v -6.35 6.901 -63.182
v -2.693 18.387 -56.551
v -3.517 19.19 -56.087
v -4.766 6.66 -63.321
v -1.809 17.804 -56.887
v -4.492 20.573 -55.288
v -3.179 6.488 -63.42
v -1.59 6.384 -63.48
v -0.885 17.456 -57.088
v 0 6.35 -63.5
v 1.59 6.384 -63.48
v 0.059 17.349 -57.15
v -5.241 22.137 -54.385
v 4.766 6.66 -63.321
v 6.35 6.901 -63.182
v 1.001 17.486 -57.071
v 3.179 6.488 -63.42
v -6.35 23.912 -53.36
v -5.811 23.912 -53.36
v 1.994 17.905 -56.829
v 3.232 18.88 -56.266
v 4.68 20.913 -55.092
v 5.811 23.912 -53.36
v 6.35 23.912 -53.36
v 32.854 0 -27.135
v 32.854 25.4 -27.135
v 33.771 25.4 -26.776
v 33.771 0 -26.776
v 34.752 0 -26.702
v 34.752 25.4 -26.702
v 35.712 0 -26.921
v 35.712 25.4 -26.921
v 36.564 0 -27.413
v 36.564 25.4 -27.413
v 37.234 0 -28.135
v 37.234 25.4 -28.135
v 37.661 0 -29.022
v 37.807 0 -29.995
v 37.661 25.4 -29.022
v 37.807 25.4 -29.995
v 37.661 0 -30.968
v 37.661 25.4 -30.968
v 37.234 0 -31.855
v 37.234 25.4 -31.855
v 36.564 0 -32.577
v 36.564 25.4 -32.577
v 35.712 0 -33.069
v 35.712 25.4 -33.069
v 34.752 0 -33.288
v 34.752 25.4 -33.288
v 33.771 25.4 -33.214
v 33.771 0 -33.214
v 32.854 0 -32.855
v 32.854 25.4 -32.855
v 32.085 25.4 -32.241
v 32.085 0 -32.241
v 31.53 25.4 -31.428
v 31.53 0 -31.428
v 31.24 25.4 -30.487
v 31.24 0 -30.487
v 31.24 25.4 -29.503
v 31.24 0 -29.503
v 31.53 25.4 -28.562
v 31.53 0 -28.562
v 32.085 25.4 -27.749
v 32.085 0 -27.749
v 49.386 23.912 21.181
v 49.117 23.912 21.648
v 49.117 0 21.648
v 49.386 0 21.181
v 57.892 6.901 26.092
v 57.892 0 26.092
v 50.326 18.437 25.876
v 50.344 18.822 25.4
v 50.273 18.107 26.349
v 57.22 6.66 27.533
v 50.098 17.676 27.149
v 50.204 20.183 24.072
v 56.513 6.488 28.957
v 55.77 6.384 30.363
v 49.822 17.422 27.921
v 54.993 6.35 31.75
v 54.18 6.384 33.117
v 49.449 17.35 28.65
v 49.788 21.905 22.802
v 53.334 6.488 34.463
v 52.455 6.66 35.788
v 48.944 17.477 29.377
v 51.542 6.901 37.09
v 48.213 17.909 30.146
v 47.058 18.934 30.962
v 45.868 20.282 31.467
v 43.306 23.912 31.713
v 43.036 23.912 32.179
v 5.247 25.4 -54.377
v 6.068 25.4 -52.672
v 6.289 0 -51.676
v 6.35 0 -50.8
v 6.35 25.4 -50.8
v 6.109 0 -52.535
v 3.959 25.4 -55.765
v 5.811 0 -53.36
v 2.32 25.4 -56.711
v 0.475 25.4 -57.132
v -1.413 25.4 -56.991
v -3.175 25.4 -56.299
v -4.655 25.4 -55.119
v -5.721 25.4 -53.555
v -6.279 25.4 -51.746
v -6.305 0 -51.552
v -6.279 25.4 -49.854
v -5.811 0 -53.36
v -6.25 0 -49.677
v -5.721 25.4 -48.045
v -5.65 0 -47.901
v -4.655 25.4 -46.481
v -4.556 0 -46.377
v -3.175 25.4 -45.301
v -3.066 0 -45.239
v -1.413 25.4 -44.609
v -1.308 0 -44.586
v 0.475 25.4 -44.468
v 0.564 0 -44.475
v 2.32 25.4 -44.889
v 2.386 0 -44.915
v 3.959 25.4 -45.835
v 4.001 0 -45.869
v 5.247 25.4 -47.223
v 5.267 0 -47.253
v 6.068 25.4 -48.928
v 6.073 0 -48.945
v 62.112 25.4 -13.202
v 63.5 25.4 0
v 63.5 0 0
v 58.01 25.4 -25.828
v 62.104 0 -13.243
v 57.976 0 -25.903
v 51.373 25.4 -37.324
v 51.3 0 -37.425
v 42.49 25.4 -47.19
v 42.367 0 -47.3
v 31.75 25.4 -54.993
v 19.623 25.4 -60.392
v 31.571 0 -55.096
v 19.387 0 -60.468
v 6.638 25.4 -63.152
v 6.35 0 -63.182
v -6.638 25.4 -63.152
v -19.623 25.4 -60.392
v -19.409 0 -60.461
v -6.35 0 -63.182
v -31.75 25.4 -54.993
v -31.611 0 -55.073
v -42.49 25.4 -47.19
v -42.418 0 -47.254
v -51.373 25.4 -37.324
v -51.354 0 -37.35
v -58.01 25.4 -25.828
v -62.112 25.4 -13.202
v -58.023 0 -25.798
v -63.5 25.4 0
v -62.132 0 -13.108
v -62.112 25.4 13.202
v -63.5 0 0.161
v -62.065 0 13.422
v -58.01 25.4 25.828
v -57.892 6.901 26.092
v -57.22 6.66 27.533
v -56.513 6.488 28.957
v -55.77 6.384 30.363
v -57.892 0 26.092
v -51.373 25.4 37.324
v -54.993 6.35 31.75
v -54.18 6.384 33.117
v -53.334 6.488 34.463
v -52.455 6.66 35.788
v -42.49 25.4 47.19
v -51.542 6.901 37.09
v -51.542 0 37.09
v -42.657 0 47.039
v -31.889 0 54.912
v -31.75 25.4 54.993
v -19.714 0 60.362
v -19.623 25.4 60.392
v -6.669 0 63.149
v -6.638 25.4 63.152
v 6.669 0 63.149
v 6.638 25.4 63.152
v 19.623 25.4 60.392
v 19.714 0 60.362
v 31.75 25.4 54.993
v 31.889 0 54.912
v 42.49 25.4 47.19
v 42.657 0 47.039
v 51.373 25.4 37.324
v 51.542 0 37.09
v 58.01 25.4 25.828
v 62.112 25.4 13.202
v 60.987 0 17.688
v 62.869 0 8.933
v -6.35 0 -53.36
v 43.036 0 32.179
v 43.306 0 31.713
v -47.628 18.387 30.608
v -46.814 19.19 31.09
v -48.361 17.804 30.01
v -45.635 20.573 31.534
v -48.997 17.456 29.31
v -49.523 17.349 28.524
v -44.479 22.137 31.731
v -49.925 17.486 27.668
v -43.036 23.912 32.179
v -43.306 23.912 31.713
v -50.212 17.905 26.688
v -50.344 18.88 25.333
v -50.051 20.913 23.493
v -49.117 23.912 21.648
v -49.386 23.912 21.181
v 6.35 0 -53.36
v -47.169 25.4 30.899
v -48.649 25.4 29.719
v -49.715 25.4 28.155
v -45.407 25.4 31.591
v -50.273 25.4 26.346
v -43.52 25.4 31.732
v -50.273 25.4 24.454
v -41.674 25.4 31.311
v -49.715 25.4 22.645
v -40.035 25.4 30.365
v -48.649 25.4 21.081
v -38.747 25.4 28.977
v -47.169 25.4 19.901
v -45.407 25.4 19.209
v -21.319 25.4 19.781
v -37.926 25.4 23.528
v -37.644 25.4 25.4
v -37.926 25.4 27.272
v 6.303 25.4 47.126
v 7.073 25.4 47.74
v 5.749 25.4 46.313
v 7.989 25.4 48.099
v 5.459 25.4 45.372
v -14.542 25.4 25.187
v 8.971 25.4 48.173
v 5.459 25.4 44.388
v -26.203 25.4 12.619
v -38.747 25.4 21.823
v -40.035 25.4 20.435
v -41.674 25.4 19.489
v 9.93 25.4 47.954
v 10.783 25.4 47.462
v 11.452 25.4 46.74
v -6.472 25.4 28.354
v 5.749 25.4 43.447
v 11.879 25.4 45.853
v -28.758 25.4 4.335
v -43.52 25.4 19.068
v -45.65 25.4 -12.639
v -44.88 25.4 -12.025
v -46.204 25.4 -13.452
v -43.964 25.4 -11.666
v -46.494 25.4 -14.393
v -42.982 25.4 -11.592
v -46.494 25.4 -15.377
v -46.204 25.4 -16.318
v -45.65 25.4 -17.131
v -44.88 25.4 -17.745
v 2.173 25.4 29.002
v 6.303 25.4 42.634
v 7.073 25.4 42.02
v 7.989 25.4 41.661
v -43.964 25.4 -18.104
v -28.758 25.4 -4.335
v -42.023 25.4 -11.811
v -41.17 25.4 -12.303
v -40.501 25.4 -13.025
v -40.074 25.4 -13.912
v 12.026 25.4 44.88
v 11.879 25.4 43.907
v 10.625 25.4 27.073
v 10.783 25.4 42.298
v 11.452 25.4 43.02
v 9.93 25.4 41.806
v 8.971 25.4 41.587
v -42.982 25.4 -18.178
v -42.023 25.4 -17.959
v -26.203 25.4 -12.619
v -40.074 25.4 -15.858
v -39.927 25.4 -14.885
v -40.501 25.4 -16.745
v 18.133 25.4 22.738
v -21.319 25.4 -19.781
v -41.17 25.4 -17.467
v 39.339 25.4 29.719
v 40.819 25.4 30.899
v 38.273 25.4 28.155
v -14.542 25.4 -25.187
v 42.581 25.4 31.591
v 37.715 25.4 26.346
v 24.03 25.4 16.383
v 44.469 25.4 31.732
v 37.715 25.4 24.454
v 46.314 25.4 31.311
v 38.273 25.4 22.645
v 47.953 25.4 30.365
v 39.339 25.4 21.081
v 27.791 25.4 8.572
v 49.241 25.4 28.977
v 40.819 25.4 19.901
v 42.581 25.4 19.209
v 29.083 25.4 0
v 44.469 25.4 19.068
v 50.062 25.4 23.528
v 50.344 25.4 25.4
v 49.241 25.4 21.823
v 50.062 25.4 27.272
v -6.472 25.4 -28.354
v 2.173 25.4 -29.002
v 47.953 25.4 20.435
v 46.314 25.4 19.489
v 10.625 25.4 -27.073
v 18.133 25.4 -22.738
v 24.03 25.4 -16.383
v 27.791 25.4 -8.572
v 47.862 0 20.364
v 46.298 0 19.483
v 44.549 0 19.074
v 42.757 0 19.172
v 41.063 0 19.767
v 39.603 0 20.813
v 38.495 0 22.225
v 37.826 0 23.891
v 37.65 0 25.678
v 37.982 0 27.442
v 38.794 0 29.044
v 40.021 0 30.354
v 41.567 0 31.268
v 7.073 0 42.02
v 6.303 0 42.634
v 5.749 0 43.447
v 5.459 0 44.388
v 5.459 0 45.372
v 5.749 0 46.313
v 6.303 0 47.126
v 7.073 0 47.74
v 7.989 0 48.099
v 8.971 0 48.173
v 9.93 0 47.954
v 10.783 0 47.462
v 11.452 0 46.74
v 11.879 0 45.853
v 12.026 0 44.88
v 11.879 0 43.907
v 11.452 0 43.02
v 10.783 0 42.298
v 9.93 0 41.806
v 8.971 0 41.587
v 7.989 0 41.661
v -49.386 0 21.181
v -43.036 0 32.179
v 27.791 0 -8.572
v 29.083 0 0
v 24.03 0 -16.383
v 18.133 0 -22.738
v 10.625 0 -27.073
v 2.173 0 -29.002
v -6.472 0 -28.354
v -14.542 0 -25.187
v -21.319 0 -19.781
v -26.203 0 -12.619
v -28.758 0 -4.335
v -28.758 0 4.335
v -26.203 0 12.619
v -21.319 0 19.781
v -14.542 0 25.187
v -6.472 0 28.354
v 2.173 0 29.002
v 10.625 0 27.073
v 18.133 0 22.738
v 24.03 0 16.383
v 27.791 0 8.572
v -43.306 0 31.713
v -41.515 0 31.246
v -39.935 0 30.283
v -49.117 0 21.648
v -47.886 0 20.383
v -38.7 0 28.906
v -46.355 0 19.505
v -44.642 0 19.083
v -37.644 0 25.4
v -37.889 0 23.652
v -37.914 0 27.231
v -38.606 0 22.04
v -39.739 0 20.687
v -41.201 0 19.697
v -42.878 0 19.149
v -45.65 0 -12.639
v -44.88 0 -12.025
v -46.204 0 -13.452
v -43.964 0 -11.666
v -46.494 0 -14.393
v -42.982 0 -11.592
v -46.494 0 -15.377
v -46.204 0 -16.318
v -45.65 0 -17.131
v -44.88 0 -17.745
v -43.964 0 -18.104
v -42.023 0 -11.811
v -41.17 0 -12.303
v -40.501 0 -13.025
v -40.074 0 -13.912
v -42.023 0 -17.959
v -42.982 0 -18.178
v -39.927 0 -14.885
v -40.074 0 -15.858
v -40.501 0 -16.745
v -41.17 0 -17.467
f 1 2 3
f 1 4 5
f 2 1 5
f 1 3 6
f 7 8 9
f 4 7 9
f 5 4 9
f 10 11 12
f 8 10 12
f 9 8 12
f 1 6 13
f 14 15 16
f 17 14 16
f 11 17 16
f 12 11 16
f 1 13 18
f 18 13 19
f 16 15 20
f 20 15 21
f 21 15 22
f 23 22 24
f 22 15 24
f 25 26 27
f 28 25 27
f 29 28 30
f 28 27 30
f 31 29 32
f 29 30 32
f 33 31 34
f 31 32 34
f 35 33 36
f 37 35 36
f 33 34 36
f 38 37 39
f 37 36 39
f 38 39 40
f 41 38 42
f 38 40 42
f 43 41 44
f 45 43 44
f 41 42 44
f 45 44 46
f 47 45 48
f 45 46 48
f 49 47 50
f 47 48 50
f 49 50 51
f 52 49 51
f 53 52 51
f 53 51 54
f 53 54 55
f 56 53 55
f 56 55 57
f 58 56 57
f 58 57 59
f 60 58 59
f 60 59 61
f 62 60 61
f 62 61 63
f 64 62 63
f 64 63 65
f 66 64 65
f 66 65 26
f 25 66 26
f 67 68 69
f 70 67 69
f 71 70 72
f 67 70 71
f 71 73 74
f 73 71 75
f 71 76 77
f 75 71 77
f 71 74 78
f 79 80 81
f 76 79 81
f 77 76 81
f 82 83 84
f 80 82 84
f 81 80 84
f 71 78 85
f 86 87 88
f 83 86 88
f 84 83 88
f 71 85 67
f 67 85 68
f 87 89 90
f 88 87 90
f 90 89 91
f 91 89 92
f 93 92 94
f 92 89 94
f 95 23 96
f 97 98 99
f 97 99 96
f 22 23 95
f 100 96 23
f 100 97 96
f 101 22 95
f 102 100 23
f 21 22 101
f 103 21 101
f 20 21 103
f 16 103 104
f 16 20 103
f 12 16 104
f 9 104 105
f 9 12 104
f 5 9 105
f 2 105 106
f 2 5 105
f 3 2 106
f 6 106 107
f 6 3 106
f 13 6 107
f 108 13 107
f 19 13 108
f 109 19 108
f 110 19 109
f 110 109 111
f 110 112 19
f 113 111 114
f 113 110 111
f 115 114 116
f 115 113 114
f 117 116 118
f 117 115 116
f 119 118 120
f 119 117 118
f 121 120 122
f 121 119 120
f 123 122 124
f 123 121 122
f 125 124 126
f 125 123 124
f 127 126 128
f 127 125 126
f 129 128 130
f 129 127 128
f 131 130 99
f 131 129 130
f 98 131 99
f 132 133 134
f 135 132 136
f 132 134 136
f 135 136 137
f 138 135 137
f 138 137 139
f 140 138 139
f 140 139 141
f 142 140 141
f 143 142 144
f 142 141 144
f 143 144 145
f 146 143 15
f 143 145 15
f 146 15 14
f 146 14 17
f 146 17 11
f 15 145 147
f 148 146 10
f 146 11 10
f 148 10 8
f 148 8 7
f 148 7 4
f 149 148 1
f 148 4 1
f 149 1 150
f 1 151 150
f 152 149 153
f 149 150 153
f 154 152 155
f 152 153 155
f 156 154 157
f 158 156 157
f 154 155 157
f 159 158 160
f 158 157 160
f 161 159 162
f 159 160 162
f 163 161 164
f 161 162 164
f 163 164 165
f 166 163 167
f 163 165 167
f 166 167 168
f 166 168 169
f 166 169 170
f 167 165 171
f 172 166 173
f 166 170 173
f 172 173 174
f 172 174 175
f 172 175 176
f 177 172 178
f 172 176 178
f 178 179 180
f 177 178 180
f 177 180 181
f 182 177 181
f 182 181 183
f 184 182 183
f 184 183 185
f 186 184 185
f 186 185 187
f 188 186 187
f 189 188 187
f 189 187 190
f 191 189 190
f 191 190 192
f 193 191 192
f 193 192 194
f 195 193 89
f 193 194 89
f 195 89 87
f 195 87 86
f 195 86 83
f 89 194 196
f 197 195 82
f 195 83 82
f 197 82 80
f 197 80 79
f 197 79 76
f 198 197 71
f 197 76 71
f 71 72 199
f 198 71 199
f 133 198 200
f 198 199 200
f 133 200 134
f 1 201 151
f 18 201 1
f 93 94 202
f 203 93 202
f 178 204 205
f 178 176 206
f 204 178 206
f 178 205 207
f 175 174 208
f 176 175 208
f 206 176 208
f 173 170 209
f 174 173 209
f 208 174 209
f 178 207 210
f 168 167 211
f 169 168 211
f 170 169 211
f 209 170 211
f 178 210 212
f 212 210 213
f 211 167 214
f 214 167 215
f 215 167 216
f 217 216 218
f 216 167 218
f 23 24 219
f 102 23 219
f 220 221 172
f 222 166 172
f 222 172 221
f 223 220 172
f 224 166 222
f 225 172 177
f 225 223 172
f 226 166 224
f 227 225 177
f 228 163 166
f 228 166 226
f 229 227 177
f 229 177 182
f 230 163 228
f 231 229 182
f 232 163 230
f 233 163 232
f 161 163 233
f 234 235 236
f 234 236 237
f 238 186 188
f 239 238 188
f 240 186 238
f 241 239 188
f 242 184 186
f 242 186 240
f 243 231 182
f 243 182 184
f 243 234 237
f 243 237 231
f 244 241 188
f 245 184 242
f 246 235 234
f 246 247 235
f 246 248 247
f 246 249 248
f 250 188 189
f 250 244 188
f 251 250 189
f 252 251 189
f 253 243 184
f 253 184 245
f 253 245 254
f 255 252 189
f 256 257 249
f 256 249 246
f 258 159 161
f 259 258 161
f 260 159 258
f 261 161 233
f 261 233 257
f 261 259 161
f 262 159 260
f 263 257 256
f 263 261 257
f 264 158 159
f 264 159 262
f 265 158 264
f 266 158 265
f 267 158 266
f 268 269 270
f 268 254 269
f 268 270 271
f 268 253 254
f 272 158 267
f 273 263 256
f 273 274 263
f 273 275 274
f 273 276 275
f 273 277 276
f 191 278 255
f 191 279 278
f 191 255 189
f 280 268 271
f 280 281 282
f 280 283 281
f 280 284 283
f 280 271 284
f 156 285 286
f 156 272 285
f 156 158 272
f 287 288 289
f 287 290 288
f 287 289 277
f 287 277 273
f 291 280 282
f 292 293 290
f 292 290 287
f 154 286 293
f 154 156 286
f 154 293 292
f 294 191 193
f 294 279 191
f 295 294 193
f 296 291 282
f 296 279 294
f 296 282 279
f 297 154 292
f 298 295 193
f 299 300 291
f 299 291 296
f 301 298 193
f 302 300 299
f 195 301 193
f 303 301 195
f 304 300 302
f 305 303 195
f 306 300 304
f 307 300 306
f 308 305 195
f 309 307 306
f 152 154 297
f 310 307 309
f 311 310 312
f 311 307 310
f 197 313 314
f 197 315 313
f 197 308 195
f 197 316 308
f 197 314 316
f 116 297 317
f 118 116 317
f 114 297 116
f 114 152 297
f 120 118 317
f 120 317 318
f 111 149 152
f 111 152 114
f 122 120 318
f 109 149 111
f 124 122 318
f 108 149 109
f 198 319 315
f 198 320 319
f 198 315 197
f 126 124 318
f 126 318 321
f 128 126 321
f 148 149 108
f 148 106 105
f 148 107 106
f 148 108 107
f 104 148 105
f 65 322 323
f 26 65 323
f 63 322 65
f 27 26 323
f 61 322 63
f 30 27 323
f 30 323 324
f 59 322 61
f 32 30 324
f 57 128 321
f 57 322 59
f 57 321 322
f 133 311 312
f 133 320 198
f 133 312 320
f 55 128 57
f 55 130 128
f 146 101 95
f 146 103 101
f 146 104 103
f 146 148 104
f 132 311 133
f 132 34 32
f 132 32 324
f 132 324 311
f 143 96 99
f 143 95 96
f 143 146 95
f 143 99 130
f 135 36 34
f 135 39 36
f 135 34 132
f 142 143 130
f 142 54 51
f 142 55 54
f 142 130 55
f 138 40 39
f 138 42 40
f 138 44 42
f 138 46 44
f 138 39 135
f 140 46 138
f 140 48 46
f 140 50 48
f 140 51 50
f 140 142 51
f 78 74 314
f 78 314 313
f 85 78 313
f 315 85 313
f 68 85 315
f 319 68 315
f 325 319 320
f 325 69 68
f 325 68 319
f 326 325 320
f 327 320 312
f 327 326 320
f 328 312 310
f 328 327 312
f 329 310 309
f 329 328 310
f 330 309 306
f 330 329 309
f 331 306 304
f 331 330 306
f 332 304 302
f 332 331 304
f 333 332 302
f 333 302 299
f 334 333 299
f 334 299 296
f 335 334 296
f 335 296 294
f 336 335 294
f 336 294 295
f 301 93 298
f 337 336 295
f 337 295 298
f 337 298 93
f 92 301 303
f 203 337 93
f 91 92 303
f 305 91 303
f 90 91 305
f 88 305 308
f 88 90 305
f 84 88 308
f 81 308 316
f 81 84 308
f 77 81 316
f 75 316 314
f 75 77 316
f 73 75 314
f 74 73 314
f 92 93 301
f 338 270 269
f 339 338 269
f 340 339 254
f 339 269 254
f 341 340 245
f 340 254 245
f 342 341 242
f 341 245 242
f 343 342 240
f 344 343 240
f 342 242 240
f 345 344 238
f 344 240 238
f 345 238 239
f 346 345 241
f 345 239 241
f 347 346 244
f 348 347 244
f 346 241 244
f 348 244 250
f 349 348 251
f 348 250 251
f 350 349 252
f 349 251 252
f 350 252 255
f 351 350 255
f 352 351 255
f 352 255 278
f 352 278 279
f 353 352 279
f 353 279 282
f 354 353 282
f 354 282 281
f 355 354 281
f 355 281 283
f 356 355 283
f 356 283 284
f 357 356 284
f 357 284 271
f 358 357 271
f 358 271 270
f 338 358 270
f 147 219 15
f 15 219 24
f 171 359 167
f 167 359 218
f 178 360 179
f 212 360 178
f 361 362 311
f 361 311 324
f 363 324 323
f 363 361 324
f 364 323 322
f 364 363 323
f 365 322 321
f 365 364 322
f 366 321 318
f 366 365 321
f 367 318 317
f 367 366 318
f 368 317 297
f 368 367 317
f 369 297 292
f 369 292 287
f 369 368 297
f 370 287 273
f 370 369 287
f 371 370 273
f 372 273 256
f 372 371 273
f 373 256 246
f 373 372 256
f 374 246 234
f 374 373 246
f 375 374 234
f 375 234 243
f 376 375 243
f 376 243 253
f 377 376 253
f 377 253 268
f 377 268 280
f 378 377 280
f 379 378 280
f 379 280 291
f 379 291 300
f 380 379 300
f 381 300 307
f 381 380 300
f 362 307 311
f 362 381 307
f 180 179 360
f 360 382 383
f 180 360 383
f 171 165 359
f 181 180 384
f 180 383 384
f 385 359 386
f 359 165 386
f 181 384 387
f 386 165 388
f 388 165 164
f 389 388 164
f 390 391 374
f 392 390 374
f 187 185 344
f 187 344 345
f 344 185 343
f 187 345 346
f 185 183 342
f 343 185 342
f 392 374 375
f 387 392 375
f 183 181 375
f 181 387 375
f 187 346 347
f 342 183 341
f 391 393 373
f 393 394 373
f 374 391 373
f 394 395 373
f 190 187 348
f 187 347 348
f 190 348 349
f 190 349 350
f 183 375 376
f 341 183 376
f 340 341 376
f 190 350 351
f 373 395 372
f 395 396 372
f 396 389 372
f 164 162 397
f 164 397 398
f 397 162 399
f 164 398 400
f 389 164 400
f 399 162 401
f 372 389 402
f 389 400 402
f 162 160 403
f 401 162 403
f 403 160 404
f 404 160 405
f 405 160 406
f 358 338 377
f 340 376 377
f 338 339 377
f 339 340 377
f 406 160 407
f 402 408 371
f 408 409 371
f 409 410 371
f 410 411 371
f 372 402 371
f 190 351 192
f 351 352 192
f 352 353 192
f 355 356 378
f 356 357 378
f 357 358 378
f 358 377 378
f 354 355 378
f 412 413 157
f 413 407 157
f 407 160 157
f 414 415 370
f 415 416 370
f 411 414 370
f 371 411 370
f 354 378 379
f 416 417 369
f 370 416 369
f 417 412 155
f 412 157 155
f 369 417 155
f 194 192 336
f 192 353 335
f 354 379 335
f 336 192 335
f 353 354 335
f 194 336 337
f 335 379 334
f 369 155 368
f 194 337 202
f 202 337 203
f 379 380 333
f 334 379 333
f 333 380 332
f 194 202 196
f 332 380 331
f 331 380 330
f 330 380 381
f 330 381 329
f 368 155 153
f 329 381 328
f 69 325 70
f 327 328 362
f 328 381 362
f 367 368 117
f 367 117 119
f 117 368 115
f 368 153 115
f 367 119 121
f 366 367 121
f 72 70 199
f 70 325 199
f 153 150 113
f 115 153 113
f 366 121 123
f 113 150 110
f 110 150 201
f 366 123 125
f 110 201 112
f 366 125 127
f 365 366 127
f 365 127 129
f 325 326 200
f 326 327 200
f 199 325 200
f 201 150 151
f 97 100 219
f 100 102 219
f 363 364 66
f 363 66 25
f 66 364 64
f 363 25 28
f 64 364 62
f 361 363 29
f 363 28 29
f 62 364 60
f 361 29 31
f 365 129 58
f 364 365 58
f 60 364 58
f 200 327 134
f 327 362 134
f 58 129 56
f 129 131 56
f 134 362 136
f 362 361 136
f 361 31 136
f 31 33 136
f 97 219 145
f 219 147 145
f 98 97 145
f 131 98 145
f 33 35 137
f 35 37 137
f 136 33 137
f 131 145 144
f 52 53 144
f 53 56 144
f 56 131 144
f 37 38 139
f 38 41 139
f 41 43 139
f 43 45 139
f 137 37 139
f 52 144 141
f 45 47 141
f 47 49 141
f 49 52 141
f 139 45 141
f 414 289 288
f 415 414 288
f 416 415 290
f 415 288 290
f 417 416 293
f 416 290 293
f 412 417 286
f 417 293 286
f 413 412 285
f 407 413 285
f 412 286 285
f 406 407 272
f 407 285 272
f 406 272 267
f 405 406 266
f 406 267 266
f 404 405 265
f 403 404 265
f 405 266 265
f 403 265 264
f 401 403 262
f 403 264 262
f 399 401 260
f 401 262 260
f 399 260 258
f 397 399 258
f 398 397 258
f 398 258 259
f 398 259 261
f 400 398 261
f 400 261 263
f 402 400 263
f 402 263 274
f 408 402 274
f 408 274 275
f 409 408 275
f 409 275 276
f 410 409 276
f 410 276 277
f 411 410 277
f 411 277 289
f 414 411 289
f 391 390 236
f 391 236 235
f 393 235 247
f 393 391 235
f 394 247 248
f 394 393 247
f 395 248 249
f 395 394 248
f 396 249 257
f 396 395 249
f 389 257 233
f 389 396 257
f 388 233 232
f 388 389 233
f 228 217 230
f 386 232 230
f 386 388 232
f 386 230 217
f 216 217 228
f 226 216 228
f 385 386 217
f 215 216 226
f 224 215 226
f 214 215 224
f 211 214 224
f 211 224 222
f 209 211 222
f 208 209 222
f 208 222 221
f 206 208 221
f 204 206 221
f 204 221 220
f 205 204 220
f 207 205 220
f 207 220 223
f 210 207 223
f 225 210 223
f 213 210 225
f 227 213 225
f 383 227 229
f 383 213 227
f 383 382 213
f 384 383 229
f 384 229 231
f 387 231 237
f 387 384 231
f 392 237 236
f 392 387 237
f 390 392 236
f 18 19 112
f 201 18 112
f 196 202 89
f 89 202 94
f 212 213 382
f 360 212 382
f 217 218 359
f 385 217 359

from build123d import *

# Parameters (mm, degrees)
SKETCH1_R           = 63.5
SKETCH1_R_2         = 29.083
SKETCH1_R_3         = 6.35
BOSS_EXTRUDE1_DEPTH = 25.4
CUT_EXTRUDE3_DEPTH  = 6.35
CIRPATTERN1_COUNT   = 3
SKETCH5_R           = 3.302
CUT_EXTRUDE4_DEPTH  = 26.4
CIRPATTERN2_COUNT   = 3


with BuildPart() as part:
    # Sketch1 → Boss-Extrude1 (new body)
    with BuildSketch(Plane(origin=(0, 0, 0), x_dir=(1, 0, 0), z_dir=(0, 1, 0))):
        Circle(SKETCH1_R)
        Circle(SKETCH1_R_2, mode=Mode.SUBTRACT)
        with Locations((0, 50.8)):
            Circle(SKETCH1_R_3, mode=Mode.SUBTRACT)
        with Locations((43.994090512, -25.4)):
            Circle(SKETCH1_R_3, mode=Mode.SUBTRACT)
        with Locations((-43.994090512, -25.4)):
            Circle(SKETCH1_R_3, mode=Mode.SUBTRACT)
    extrude(amount=BOSS_EXTRUDE1_DEPTH)

    # Sketch4 → Cut-Extrude3 (cut, symmetric)
    with BuildSketch(Plane(origin=(0, 0, 0), x_dir=(0, 0, -1), z_dir=(1, 0, 0))):
        Polygon((63.5, 0), (63.5, 6.35), (53.360319725, 23.912441409), (53.360319725, 0), align=None)
    cut_extrude3 = extrude(amount=CUT_EXTRUDE3_DEPTH, both=True, mode=Mode.SUBTRACT)

    # CirPattern1: Cut-Extrude3 ×3 about axis
    cirpattern1_axis = Axis((0, 0, 0), (0, 1, 0))
    for i in range(1, CIRPATTERN1_COUNT):
        add(cut_extrude3.rotate(cirpattern1_axis, i * 360 / CIRPATTERN1_COUNT), mode=Mode.SUBTRACT)

    # Sketch5 → Cut-Extrude4 (cut, through all)
    with BuildSketch(Plane(origin=(0, 25.4, 0), x_dir=(1, 0, 0), z_dir=(0, 1, 0))):
        with Locations((-43.229109276, 14.884976022)):
            Circle(SKETCH5_R)
    cut_extrude4 = extrude(amount=-CUT_EXTRUDE4_DEPTH, mode=Mode.SUBTRACT)

    # CirPattern2: Cut-Extrude4 ×3 about axis
    cirpattern2_axis = Axis((0, 0, 0), (0, 1, 0))
    for i in range(1, CIRPATTERN2_COUNT):
        add(cut_extrude4.rotate(cirpattern2_axis, i * 360 / CIRPATTERN2_COUNT), mode=Mode.SUBTRACT)


solid = part.part
